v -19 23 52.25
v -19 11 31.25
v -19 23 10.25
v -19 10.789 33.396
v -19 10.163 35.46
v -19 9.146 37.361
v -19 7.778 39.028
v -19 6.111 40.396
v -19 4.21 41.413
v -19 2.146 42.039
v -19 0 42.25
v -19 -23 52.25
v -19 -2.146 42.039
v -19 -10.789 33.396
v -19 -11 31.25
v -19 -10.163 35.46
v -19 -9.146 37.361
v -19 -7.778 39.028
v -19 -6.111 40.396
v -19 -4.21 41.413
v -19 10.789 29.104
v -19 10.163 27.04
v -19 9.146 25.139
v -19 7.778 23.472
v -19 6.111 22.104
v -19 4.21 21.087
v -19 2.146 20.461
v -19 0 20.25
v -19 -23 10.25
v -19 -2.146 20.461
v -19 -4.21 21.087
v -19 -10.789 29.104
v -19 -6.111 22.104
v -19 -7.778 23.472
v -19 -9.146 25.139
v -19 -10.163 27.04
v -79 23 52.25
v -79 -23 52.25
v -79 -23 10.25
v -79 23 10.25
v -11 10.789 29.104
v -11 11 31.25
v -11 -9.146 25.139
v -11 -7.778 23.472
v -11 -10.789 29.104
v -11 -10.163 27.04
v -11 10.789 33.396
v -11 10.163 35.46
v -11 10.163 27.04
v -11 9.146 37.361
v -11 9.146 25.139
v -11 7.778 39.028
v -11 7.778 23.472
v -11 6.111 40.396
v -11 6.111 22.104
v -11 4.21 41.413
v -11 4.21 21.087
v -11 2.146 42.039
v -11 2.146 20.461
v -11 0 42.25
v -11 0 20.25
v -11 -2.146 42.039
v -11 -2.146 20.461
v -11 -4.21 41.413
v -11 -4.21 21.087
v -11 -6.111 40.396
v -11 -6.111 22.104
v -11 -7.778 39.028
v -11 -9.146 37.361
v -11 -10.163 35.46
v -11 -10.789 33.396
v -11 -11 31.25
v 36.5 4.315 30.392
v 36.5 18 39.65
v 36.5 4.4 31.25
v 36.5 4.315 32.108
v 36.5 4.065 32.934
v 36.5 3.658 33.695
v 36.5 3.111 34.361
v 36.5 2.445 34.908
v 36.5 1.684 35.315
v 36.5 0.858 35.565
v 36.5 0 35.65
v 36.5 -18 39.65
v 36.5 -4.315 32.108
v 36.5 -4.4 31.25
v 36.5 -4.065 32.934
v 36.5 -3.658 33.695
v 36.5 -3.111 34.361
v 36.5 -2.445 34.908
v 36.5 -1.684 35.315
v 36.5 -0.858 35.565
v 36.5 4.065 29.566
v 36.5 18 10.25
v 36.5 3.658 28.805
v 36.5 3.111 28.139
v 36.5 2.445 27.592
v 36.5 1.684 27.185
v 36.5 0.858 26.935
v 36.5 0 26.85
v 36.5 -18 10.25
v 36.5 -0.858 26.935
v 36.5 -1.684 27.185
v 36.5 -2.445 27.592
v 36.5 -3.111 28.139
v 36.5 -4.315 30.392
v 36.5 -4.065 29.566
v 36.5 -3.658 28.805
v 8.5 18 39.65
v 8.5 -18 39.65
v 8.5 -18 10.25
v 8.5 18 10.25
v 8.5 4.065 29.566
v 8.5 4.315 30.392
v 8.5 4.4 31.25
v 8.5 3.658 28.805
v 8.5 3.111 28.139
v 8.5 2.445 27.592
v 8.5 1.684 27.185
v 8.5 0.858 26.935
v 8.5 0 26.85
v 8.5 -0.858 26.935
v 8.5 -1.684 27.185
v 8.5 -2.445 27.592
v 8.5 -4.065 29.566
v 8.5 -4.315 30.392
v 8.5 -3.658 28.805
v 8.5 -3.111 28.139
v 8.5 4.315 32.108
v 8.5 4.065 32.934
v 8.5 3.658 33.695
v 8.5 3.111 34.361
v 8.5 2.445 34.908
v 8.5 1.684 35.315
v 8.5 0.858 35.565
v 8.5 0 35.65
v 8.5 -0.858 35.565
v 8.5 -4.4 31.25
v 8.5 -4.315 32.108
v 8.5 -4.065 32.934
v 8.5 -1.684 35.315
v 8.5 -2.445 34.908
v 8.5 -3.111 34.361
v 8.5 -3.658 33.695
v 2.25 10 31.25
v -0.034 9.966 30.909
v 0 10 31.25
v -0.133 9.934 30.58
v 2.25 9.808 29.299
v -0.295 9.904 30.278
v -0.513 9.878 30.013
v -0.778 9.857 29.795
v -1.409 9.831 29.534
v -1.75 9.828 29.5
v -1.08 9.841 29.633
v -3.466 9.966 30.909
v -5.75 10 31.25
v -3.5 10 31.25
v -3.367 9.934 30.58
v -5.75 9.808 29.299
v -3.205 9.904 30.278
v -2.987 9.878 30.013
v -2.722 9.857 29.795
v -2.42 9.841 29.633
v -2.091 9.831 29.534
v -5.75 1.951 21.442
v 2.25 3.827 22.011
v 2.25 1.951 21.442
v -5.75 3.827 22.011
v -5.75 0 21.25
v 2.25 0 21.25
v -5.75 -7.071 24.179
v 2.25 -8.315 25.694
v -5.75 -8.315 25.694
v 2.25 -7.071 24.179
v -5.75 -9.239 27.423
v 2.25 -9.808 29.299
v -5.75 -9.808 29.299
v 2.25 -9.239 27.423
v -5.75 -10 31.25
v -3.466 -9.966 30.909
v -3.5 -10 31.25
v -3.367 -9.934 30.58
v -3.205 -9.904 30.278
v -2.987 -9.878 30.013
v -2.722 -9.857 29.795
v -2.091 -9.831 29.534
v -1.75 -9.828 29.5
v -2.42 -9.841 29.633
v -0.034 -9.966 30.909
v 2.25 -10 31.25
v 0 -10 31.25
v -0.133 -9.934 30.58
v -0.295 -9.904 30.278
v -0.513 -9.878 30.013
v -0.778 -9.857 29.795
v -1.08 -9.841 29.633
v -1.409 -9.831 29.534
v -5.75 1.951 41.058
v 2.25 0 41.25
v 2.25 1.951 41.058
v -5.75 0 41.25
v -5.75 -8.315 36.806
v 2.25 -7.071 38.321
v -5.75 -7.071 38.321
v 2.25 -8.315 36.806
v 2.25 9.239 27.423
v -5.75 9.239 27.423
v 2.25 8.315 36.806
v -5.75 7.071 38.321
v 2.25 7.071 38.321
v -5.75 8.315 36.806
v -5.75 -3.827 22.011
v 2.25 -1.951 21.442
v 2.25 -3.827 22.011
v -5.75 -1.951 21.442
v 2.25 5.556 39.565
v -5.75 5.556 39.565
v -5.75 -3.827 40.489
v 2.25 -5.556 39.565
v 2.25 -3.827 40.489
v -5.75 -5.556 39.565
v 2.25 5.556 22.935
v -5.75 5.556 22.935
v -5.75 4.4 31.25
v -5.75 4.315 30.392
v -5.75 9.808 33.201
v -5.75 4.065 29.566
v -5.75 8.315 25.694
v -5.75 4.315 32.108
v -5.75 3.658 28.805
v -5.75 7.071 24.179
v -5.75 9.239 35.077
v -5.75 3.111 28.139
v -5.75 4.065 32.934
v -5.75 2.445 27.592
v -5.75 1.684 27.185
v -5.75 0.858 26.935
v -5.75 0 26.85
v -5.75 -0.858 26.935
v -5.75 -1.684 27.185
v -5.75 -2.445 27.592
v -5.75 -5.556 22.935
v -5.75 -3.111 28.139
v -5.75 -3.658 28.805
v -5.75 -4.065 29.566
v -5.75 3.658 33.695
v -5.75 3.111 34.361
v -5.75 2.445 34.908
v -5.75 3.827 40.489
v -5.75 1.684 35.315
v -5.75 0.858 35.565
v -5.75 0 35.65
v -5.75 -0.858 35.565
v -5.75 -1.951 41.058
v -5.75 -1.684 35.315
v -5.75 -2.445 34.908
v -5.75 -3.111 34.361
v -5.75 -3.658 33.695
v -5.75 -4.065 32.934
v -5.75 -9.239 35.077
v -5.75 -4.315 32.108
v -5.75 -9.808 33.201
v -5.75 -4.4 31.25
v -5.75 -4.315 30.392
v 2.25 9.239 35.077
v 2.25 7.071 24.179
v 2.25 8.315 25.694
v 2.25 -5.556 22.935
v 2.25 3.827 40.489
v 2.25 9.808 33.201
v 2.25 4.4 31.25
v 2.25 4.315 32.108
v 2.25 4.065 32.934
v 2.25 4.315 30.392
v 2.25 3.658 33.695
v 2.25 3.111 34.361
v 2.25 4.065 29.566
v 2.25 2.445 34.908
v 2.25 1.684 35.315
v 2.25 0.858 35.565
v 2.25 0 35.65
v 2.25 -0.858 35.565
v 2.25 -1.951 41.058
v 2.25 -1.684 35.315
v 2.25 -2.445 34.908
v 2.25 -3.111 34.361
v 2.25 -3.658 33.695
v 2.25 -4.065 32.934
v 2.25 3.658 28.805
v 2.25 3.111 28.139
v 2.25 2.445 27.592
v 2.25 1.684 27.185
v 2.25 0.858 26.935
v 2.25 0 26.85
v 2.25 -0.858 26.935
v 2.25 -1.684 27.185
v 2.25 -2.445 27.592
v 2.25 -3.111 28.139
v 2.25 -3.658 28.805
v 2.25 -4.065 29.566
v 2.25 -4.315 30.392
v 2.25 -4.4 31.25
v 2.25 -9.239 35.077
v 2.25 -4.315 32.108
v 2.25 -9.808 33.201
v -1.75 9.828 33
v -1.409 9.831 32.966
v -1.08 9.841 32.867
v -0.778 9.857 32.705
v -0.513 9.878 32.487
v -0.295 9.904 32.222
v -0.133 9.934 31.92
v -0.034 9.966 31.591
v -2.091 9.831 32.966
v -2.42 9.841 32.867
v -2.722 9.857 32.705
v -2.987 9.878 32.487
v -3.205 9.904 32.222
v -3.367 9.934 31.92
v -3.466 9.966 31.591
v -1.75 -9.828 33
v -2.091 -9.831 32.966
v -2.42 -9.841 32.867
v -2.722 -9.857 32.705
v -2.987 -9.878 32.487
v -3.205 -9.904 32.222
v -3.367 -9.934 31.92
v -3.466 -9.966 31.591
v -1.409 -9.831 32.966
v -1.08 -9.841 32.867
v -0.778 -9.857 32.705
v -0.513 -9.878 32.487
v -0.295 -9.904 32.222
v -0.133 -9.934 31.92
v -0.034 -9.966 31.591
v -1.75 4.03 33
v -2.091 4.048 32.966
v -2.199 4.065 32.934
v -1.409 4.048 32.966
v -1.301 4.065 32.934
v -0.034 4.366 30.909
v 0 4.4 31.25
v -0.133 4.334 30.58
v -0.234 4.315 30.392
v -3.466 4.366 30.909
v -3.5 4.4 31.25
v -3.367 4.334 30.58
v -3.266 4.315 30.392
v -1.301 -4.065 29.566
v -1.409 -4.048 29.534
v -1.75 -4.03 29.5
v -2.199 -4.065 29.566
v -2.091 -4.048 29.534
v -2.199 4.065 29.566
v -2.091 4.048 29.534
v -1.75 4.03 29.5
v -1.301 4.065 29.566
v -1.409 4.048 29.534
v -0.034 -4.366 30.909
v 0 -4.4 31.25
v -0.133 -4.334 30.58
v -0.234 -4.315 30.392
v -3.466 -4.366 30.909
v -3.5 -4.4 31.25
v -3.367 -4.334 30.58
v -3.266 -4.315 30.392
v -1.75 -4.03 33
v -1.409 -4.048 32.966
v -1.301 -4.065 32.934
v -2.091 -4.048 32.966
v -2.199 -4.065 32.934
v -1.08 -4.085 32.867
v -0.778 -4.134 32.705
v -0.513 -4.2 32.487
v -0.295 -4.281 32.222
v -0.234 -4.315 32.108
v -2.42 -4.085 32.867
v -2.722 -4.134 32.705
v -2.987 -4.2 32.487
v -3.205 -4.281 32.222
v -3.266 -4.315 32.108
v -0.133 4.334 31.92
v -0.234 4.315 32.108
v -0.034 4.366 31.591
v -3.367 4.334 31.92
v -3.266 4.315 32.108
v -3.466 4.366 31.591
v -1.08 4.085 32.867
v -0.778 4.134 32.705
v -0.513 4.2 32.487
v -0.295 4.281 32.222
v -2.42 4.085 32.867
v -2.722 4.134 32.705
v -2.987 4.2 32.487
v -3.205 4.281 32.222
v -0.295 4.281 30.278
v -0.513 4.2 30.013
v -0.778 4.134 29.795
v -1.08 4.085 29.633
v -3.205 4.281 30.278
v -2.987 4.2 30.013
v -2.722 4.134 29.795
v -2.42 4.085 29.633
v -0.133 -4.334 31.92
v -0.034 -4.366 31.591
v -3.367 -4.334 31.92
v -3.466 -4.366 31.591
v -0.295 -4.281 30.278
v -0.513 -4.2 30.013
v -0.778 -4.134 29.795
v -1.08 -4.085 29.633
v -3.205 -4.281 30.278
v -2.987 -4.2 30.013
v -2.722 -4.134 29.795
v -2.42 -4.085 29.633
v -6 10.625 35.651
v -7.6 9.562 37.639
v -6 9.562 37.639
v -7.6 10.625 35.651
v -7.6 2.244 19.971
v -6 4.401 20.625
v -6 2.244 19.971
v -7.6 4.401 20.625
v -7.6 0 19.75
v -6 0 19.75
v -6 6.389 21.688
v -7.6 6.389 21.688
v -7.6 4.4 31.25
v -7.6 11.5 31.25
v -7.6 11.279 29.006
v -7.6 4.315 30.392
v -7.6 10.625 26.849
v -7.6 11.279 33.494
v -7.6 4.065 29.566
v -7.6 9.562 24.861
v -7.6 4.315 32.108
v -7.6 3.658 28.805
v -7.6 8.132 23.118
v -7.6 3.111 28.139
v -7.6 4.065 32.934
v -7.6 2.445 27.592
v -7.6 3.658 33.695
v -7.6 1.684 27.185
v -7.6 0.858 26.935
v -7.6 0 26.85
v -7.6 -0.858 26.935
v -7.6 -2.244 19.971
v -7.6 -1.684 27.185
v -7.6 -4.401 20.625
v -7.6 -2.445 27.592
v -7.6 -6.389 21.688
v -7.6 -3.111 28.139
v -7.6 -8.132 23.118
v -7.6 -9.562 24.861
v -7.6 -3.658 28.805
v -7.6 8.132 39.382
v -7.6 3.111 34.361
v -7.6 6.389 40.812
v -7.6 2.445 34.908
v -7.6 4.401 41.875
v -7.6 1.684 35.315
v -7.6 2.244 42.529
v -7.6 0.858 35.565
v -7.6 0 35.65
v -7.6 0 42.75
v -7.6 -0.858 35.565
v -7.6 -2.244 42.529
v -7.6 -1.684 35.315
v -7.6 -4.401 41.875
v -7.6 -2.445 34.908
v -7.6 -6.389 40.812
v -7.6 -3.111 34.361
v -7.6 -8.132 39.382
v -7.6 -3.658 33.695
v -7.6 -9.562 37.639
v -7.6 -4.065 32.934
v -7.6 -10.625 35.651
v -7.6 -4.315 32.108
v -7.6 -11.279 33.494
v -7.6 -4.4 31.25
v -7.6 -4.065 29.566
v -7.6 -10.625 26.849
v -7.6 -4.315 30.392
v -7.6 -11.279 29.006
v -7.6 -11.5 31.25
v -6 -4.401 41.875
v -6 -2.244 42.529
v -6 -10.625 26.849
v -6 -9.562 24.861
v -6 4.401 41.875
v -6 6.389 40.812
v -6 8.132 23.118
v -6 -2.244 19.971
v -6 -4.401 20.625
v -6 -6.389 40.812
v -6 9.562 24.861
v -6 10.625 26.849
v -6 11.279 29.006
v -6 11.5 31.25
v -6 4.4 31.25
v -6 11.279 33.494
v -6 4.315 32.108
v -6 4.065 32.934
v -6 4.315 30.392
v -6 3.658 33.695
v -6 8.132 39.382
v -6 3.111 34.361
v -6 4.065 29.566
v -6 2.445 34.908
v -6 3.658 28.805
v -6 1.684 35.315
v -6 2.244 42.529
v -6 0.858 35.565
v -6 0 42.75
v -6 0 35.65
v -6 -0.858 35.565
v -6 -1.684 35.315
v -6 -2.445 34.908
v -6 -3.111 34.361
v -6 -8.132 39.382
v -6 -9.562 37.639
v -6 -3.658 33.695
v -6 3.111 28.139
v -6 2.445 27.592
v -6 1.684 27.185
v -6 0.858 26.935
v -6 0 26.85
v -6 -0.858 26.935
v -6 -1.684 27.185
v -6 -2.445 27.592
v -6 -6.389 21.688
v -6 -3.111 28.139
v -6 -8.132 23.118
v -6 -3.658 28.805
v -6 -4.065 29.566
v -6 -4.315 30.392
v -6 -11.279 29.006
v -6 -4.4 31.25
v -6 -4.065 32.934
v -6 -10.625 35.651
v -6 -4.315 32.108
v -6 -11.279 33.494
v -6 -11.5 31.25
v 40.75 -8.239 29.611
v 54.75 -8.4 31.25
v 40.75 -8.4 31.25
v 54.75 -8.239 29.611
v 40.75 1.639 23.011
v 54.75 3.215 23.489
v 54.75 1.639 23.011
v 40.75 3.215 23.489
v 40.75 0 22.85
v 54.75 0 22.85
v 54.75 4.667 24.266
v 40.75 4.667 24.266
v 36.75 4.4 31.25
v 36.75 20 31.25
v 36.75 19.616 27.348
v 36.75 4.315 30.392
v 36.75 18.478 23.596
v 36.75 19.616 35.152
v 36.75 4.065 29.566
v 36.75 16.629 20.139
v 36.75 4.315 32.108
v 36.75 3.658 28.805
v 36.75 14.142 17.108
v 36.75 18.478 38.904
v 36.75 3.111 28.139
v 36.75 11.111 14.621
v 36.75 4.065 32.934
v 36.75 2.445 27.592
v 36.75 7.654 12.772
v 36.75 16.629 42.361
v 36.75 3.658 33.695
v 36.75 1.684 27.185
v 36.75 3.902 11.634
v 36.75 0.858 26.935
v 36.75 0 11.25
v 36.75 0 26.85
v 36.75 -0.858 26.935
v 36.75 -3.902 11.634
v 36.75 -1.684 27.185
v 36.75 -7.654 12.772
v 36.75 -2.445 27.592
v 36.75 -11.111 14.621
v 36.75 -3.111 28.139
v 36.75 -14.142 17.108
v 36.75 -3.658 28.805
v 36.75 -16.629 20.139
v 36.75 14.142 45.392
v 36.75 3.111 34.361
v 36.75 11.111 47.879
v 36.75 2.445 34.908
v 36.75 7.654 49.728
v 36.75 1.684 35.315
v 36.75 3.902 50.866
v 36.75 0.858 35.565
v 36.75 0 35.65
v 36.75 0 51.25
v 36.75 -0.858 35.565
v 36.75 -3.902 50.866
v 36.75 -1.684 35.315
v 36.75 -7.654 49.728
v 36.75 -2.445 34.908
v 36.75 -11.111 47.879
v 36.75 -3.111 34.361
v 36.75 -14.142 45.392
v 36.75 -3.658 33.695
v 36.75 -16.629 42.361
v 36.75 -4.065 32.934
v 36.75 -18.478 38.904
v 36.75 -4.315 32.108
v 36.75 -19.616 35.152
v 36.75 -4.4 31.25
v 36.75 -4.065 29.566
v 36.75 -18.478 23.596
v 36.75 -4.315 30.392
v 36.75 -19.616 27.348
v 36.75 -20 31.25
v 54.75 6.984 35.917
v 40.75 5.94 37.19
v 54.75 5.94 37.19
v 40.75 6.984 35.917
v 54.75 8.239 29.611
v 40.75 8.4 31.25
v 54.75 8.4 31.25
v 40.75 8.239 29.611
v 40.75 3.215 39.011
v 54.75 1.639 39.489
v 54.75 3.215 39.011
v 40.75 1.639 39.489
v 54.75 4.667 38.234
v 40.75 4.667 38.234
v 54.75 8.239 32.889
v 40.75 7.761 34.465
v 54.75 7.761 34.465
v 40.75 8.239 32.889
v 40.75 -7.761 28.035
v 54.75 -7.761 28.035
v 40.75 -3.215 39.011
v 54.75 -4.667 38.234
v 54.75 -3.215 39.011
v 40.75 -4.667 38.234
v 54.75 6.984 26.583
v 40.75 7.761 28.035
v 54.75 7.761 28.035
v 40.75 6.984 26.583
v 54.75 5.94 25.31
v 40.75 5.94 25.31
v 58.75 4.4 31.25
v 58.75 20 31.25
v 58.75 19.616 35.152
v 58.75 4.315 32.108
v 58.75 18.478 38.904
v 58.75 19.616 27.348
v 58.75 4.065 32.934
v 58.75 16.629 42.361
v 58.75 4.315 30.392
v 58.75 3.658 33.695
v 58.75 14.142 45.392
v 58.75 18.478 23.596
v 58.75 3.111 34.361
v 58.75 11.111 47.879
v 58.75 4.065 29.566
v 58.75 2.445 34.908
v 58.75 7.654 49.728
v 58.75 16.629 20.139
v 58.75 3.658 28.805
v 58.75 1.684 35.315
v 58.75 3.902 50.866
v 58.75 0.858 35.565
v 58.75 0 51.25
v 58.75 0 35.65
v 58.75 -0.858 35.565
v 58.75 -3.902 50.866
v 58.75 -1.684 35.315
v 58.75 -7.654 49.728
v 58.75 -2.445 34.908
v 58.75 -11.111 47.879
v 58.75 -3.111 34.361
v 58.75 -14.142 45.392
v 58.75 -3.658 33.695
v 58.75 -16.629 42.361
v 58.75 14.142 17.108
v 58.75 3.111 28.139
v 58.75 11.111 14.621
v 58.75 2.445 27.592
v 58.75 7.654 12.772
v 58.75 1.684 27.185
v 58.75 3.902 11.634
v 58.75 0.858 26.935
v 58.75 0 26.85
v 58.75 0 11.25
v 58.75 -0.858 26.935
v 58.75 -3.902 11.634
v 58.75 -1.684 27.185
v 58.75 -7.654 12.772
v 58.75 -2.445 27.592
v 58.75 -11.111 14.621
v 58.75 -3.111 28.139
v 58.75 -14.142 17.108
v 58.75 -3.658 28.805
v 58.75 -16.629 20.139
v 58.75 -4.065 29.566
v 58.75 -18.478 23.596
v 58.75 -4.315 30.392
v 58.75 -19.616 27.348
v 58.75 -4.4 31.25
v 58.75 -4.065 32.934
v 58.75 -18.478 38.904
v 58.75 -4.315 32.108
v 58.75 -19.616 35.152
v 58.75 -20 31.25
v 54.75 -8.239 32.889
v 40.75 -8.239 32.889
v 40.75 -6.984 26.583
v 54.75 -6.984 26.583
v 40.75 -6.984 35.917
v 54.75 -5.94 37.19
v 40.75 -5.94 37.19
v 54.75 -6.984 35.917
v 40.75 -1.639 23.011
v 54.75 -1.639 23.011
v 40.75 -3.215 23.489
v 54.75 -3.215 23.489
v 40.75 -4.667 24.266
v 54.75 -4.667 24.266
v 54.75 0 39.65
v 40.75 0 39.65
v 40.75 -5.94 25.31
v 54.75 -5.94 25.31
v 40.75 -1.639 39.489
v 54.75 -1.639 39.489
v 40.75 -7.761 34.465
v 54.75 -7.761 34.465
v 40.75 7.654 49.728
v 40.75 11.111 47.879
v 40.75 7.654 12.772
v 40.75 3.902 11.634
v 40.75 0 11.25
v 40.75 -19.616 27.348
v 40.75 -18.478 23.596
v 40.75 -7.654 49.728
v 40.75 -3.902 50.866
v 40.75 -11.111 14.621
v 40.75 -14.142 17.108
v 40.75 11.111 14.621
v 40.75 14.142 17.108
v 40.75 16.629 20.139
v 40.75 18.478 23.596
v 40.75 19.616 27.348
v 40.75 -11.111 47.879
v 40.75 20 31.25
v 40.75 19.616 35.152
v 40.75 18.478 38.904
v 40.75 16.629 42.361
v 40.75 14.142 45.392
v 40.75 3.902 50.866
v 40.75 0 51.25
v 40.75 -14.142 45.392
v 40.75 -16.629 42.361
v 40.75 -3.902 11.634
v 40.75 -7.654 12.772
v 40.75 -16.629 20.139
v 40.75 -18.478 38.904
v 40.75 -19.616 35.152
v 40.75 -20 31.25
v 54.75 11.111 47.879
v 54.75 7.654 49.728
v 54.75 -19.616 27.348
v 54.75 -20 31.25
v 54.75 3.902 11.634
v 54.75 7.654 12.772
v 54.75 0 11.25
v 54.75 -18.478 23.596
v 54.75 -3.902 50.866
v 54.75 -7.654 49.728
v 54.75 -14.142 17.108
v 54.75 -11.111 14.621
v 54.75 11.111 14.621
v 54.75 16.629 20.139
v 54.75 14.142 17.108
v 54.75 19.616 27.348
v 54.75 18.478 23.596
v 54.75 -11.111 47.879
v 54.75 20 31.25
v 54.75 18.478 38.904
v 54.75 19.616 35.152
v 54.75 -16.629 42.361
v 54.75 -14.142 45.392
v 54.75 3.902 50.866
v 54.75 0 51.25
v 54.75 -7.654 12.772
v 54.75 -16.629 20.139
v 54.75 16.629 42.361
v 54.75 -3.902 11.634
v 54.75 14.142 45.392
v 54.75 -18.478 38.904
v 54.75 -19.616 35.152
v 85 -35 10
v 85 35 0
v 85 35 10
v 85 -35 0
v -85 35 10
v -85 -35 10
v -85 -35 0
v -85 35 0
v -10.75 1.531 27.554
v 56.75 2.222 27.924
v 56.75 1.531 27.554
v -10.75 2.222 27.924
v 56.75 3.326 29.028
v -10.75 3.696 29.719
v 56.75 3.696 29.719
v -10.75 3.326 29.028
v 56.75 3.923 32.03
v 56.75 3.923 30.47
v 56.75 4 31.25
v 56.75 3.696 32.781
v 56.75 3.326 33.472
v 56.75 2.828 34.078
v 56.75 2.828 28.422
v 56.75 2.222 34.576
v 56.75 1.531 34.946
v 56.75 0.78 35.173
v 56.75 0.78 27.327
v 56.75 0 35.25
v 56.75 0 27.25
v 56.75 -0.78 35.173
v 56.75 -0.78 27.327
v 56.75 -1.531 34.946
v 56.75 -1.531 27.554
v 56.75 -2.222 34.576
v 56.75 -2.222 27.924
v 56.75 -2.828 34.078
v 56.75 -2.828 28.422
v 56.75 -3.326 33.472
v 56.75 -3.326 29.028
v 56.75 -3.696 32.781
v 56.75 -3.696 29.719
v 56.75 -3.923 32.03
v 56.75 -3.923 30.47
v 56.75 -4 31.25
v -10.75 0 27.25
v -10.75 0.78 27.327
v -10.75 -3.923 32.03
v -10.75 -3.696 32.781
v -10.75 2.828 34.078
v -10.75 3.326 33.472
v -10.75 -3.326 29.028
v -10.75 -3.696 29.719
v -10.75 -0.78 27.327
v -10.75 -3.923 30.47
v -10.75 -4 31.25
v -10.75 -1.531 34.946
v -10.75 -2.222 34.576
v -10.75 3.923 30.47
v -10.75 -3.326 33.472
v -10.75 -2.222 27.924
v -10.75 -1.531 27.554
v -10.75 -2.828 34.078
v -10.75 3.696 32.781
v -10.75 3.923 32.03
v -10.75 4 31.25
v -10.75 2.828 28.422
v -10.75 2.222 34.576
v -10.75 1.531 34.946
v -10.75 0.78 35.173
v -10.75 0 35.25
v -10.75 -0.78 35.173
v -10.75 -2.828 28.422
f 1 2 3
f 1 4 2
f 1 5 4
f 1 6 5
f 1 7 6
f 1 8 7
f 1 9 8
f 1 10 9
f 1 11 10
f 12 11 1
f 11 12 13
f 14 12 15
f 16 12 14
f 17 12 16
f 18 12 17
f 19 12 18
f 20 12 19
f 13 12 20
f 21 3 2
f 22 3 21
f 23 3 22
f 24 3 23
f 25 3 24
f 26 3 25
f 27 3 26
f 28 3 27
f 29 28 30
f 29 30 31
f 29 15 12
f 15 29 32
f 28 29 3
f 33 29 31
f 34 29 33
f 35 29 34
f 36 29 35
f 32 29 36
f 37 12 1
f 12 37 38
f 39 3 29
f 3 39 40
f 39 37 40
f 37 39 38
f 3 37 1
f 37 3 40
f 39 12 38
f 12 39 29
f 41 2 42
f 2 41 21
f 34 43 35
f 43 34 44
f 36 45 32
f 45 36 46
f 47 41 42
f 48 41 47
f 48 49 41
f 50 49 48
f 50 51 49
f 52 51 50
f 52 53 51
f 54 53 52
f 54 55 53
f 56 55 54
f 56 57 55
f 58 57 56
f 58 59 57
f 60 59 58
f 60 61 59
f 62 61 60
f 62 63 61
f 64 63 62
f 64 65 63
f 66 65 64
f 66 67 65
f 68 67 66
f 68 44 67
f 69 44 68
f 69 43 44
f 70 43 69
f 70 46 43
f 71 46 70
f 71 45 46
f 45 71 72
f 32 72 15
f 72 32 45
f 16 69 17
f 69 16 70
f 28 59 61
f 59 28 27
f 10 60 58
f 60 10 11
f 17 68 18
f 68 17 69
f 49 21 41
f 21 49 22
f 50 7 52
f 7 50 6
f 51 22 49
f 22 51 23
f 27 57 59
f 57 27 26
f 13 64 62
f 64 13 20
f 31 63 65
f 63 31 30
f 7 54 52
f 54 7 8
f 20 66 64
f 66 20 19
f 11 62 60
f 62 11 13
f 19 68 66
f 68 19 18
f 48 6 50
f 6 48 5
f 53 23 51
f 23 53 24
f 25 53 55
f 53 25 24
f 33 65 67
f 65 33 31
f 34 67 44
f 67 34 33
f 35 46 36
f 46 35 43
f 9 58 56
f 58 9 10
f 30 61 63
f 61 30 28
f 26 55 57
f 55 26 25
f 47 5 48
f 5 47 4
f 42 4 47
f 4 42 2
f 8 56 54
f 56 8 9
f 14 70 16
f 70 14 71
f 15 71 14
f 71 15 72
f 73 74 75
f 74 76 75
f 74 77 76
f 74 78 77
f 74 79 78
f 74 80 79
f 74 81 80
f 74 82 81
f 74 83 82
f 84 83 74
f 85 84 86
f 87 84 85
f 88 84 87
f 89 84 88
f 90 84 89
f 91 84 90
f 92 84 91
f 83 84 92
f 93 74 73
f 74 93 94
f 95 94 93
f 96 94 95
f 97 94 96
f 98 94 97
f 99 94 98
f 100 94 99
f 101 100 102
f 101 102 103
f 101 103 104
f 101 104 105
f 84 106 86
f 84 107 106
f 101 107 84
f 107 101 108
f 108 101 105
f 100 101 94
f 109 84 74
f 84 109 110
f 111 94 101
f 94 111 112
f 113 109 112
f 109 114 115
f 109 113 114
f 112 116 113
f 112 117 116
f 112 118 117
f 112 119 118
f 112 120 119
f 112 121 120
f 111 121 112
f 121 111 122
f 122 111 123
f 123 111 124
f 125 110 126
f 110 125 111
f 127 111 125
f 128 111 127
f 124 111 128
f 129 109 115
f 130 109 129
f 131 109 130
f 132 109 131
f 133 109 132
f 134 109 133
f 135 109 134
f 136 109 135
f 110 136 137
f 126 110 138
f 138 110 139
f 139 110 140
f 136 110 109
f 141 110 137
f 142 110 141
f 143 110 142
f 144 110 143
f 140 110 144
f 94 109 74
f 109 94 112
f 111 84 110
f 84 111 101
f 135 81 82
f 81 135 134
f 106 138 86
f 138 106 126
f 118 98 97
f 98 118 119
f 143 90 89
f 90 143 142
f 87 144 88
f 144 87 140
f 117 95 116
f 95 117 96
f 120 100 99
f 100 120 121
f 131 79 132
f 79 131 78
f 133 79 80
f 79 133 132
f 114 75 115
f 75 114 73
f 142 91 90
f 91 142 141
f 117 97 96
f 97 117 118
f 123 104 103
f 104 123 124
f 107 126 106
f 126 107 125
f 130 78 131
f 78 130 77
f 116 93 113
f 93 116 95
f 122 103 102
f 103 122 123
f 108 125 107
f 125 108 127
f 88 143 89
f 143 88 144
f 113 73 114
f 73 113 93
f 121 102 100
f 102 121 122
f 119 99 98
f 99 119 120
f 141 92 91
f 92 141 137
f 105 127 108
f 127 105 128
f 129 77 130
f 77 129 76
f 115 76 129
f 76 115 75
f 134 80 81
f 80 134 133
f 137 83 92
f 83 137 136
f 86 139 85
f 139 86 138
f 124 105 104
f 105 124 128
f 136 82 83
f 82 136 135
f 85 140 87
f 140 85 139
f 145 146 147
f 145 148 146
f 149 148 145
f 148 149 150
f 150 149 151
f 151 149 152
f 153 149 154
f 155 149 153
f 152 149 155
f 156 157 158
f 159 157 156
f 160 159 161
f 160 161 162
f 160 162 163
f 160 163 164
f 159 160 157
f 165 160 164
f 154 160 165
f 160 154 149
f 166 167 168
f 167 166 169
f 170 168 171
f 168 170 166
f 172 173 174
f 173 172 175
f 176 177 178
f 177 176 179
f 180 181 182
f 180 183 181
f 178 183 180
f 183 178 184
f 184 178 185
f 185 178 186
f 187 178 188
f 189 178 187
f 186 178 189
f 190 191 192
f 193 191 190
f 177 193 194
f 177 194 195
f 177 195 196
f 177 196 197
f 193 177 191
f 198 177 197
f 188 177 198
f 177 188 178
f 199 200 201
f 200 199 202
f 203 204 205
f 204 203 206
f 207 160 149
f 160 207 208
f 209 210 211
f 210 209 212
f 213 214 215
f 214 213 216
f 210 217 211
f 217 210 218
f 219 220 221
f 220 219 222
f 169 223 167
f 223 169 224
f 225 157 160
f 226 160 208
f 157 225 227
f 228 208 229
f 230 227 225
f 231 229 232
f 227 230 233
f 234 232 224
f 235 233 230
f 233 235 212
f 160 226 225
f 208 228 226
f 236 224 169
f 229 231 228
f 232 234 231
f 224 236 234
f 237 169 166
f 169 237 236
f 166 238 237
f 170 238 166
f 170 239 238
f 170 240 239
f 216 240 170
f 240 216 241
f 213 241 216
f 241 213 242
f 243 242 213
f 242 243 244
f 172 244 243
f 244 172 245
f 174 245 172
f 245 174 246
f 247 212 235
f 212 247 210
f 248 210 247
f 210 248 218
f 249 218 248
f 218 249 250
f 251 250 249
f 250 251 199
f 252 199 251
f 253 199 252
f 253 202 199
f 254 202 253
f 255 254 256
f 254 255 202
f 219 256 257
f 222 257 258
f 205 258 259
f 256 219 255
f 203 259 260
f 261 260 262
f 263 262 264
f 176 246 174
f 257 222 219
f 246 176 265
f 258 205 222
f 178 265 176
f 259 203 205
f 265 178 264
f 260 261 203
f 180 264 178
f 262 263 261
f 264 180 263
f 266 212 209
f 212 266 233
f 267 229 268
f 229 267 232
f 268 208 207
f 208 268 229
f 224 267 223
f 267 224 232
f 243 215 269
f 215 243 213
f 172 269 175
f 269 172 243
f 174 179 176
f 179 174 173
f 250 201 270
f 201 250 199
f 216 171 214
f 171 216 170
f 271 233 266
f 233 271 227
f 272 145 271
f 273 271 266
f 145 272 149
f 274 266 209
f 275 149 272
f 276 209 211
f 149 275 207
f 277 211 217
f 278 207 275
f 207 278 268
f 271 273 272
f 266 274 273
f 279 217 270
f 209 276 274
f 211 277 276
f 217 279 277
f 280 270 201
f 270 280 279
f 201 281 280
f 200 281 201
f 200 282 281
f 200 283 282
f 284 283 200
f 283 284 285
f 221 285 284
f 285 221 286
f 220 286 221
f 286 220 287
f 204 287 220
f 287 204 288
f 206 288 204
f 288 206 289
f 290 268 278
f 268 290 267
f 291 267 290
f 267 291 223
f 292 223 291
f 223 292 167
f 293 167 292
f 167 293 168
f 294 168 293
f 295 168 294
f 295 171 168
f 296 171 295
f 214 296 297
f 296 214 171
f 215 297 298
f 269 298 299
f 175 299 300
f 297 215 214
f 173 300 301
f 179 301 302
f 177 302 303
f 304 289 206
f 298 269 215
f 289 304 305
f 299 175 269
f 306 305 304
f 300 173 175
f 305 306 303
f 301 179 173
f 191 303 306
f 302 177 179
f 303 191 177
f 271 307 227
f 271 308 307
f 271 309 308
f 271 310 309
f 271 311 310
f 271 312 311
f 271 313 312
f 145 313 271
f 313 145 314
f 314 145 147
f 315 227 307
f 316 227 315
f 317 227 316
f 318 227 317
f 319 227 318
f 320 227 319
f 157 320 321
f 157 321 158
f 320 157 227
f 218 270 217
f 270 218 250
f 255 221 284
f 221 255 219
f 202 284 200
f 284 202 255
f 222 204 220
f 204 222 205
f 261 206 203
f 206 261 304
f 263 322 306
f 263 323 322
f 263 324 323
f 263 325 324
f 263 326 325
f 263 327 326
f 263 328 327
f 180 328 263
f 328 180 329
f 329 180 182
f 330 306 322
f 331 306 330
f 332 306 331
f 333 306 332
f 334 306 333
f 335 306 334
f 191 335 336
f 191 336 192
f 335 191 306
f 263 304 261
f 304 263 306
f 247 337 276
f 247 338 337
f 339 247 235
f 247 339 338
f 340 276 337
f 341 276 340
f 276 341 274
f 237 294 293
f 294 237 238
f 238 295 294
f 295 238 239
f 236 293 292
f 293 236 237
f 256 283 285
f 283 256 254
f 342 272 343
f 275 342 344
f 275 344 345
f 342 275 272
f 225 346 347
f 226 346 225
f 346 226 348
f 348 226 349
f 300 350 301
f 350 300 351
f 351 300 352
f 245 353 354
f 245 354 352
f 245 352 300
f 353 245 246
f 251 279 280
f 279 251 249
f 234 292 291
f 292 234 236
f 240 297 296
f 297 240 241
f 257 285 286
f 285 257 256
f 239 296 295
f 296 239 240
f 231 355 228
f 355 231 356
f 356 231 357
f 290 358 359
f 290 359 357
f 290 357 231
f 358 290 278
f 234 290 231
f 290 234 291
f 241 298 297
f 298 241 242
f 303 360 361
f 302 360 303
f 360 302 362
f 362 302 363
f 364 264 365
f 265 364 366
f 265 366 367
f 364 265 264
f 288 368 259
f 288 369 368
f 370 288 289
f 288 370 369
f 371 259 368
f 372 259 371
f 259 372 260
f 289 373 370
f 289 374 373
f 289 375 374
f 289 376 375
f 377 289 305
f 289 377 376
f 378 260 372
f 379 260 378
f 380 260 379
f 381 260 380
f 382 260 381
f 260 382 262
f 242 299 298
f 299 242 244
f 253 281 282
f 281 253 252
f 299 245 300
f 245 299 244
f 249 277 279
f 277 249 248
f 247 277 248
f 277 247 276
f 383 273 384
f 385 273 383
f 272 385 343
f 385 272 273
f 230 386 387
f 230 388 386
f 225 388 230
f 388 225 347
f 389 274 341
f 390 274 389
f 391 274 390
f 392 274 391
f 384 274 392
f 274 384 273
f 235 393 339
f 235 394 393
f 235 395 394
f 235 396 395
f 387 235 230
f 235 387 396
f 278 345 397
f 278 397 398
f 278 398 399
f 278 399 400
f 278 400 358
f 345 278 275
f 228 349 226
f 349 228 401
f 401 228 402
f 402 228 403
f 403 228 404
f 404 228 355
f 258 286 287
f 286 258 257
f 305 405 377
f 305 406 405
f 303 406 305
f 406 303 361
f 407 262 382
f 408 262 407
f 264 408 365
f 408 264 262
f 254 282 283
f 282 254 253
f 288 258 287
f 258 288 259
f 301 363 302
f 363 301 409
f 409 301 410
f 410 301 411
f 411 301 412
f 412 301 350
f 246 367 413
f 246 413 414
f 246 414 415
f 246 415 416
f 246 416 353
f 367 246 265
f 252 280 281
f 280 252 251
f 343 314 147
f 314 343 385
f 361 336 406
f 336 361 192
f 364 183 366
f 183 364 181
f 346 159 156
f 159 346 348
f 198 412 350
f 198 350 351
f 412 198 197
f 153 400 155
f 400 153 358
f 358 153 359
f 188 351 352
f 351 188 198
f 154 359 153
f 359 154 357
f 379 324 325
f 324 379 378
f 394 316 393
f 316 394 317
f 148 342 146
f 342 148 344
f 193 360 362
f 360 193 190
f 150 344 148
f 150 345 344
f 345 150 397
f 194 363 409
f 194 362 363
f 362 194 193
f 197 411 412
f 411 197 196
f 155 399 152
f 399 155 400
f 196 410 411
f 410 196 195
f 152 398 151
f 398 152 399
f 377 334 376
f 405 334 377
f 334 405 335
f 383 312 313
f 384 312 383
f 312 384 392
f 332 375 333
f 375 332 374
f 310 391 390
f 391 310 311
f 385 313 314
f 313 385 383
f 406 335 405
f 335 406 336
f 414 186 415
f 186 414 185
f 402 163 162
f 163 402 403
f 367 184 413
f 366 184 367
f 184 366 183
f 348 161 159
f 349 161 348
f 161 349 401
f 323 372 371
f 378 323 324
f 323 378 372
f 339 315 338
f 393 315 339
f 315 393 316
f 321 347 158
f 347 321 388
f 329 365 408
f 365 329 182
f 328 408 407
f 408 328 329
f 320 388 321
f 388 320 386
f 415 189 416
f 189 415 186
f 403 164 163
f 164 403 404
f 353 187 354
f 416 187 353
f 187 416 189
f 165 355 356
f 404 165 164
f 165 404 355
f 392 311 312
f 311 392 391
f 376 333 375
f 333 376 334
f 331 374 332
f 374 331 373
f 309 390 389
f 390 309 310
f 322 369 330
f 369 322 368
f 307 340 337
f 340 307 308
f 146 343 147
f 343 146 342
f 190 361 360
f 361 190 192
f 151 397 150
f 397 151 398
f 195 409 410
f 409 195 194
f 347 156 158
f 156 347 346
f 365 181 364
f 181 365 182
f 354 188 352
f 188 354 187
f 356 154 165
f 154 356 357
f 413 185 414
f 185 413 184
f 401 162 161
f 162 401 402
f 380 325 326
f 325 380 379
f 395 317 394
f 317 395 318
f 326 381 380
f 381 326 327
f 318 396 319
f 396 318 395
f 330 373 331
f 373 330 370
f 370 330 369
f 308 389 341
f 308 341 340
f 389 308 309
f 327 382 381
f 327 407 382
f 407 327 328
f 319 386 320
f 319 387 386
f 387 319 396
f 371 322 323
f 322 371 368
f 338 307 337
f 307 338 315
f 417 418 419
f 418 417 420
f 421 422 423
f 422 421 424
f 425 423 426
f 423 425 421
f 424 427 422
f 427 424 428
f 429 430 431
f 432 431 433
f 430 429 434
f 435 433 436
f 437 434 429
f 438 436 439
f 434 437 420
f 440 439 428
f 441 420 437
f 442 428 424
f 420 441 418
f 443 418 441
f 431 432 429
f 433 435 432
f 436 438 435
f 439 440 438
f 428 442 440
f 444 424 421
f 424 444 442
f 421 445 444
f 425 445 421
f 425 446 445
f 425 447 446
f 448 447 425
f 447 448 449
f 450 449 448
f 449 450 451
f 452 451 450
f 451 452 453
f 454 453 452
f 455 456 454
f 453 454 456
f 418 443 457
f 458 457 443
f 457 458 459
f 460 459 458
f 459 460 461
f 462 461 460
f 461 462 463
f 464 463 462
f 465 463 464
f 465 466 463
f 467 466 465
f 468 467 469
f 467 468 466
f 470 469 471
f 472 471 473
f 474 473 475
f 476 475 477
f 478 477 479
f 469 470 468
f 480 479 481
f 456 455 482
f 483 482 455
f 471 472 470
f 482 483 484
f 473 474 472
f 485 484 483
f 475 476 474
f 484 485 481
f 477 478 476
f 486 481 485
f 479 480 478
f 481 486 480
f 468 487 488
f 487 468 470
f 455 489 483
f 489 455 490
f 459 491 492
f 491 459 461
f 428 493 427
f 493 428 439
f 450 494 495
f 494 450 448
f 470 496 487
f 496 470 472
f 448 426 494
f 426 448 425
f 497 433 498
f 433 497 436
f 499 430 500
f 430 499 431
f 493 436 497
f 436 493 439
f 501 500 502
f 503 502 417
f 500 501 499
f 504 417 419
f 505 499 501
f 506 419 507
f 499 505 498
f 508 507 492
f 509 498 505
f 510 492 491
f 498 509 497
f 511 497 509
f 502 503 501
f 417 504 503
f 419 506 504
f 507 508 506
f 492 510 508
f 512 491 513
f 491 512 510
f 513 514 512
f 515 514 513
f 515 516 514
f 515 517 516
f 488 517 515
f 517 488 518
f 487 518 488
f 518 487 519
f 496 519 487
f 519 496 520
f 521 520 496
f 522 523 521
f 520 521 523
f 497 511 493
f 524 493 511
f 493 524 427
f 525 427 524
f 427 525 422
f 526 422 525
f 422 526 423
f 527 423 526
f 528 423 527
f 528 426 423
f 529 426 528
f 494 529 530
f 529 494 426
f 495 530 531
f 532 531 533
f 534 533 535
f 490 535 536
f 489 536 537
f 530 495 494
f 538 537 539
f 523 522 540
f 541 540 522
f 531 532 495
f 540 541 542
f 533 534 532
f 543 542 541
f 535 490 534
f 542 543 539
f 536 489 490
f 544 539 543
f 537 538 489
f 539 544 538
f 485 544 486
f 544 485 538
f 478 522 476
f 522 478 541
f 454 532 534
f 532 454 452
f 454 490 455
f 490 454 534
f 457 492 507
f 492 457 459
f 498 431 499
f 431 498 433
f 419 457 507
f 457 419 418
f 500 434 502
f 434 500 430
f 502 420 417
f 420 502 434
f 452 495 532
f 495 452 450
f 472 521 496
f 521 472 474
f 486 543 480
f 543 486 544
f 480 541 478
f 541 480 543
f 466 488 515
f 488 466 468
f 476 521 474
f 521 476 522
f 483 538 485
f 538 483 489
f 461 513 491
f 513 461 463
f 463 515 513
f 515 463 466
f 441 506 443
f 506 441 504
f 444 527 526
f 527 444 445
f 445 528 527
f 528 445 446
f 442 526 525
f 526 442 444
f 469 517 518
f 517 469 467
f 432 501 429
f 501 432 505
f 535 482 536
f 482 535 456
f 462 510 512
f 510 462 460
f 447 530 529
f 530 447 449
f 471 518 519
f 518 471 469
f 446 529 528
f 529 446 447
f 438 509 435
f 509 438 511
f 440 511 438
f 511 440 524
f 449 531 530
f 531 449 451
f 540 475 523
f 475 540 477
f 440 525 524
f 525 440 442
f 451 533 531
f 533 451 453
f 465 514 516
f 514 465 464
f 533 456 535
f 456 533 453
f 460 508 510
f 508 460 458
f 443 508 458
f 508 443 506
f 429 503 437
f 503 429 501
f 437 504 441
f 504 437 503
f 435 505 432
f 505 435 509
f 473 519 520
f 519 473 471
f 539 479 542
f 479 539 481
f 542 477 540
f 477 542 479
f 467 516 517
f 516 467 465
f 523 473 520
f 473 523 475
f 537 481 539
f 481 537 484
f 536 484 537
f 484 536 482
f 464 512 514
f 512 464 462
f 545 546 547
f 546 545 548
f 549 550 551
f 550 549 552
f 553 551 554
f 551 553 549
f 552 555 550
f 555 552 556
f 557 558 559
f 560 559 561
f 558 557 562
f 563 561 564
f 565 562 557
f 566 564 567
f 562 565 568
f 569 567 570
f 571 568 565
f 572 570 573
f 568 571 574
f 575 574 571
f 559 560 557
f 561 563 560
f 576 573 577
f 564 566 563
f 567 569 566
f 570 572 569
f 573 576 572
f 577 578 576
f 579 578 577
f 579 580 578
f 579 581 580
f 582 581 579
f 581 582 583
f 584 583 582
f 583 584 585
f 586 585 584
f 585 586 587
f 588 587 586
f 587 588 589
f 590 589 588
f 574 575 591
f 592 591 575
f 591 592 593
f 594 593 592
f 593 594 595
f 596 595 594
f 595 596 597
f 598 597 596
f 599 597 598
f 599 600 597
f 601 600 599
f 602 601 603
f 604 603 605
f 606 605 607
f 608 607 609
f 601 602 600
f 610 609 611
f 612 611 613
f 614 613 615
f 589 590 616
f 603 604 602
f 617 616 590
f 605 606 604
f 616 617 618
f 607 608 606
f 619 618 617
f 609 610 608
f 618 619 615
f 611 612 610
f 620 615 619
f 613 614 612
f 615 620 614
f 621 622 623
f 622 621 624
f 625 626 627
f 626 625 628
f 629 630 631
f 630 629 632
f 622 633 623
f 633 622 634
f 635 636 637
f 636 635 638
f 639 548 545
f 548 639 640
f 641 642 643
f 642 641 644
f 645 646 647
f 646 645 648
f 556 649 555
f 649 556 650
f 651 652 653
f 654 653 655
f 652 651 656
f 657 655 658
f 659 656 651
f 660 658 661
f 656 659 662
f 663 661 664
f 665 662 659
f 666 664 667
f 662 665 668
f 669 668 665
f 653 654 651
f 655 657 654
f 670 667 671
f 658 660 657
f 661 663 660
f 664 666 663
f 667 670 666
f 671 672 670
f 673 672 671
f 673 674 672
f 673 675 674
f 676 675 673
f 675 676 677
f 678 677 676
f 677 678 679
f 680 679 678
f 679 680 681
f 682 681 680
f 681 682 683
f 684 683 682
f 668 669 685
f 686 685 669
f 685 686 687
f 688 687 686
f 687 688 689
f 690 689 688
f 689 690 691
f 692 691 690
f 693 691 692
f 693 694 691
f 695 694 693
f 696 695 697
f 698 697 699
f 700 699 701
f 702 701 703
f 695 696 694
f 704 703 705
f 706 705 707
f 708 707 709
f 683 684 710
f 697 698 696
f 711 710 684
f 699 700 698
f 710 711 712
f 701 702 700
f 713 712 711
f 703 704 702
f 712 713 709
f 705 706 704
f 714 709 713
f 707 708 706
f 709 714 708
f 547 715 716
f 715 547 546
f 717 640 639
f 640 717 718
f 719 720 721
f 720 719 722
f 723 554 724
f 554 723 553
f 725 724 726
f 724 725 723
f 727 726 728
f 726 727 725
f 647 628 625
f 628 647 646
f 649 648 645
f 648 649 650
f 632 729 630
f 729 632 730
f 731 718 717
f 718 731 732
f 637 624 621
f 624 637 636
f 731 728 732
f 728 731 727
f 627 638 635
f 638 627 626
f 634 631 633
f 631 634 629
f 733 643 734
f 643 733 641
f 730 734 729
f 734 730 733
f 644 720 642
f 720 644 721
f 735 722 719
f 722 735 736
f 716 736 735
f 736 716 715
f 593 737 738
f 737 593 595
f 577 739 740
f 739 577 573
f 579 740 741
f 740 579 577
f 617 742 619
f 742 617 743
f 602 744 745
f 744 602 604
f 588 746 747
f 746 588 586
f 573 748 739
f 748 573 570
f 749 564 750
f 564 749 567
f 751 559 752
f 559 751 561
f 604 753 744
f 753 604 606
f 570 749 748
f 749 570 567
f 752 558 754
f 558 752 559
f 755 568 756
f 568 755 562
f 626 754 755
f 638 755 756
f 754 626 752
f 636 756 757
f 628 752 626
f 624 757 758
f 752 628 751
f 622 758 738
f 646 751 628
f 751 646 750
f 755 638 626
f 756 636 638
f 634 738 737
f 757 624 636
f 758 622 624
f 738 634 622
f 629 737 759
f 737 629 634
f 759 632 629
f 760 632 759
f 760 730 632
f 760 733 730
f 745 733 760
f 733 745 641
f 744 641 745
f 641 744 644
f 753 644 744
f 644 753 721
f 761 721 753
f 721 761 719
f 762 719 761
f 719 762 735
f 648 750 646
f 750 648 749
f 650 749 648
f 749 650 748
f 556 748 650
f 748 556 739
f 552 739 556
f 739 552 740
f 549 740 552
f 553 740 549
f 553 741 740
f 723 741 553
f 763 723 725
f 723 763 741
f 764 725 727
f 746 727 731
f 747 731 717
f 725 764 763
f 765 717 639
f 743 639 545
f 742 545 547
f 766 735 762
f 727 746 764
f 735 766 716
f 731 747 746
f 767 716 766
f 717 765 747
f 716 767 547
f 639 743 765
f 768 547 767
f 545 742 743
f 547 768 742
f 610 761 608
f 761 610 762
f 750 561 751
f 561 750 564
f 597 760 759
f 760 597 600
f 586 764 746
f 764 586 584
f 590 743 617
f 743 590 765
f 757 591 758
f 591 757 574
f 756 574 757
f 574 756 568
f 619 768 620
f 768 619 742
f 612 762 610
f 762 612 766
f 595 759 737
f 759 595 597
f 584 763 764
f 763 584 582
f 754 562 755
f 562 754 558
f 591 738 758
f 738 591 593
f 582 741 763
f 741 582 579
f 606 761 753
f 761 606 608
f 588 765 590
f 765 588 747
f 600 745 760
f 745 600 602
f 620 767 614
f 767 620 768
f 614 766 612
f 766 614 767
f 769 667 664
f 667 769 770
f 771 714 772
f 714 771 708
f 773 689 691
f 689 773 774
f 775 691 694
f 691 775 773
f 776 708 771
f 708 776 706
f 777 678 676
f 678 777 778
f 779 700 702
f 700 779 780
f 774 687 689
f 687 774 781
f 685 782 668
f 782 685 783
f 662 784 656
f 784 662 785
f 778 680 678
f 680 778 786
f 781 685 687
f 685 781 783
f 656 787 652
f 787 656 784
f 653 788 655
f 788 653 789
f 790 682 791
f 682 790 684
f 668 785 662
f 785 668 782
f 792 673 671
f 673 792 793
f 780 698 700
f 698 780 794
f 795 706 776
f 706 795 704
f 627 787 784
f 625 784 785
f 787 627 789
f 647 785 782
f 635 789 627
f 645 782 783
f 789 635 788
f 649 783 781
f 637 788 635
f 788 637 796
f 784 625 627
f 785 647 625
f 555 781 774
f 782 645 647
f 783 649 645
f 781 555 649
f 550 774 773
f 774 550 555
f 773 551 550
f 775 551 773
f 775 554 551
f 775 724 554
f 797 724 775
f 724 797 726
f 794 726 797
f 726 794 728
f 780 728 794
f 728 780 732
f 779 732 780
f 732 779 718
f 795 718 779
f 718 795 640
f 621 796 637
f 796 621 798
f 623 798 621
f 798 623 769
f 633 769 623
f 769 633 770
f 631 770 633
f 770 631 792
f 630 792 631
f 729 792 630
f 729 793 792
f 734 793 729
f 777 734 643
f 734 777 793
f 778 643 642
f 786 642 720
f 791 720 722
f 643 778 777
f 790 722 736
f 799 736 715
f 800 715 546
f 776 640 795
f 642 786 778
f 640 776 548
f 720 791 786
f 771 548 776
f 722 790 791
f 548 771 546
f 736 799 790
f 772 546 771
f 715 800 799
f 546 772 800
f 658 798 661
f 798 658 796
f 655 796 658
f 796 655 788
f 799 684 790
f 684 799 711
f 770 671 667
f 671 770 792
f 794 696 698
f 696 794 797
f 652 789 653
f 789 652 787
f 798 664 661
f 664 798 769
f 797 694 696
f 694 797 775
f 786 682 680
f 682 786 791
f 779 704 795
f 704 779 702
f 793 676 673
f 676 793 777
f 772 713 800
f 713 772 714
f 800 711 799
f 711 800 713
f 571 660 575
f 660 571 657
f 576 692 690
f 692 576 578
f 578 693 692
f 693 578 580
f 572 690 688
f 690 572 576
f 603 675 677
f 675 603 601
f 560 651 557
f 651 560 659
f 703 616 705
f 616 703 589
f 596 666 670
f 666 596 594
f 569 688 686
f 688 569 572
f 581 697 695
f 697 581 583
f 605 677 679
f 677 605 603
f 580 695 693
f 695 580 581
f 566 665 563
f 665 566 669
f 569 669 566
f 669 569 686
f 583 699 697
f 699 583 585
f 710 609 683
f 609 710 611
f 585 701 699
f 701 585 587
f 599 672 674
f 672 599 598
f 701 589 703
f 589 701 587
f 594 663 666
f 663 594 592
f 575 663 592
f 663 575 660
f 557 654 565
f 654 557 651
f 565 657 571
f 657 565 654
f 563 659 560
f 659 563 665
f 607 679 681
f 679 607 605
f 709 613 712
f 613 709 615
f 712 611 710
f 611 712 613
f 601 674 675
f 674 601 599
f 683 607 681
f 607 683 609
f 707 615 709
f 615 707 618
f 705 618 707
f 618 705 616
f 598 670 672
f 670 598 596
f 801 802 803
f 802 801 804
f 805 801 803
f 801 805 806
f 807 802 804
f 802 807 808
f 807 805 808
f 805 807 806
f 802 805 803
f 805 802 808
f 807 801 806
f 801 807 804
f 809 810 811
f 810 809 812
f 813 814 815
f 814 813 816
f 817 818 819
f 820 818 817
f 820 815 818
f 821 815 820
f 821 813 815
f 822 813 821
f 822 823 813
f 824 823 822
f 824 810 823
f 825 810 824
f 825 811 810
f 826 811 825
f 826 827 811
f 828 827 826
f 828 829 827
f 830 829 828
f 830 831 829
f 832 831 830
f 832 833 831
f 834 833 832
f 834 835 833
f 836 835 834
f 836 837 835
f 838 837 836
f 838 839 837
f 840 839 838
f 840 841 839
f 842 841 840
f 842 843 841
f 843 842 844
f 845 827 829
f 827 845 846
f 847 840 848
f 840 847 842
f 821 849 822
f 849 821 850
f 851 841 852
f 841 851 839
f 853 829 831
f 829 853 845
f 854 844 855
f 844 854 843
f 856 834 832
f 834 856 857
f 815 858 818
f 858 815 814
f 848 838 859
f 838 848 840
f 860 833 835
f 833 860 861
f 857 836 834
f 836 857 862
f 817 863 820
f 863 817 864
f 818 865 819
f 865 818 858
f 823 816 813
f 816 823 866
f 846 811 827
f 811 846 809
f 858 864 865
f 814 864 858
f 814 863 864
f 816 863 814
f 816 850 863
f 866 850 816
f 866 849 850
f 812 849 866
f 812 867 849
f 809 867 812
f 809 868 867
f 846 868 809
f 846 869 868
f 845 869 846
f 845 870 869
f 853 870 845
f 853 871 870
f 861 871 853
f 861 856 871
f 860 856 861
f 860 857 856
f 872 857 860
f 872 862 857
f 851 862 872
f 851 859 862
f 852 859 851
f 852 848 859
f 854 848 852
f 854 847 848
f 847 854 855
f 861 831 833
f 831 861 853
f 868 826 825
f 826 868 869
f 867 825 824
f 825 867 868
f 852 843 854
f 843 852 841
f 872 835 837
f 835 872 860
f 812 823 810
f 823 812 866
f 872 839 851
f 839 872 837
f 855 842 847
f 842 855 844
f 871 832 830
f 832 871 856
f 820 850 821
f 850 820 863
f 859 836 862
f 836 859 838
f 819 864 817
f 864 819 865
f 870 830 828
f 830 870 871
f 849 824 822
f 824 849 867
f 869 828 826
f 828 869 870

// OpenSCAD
$fn = 32;

// ------------------------------------------------------------------------
// Motor drive station: motor 60 x 42 mm, shaft d8, pulley d40
// Every part is its own module, assembly() places every instance.
// ------------------------------------------------------------------------

// --- part 1 ---
module station_bed() {
  difference() {
    translate([-85, -35, 0]) cube([170, 70, 10]);
  }
}

// --- part 2 ---
module drive_motor() {
  union() {
    translate([-30, -23, 0]) cube([60, 46, 42]);
    translate([34, 0, 21]) rotate([0, 90, 0]) cylinder(h = 8, d = 22, center = true);
  }
}

// --- part 3 ---
module pillow_block() {
  difference() {
    translate([-14, -18, 0]) cube([28, 36, 29.4]);
    translate([0, 0, 21]) rotate([0, 90, 0]) cylinder(h = 30, d = 8.8, center = true);
  }
}

// --- part 4 ---
module drive_shaft() {
  translate([0, 0, -33.75]) cylinder(h = 67.5, d = 8);
}

// --- part 5 ---
module shaft_collar() {
  difference() {
    cylinder(h = 8, d = 20);
    translate([0, 0, -1]) cylinder(h = 10, d = 8.8);
    translate([0, 0, 4]) rotate([90, 0, 0]) cylinder(h = 22, d = 3.5, center = true);
  }
}

// --- part 6 ---
module collar_washer() {
  difference() {
      translate([0, 0, 0]) cylinder(h = 1.6, d = 23);
      translate([0, 0, -1]) cylinder(h = 3.6, d = 8.8);
    }
}

// --- part 7 ---
module drive_pulley() {
  difference() {
    union() {
      cylinder(h = 22, d = 16.8);
      cylinder(h = 4, d = 40);
      translate([0, 0, 18]) cylinder(h = 4, d = 40);
    }
    translate([0, 0, -1]) cylinder(h = 24, d = 8.8);
  }
}

// --- assembly ---
module assembly() {
  color([0.80, 0.24, 0.20]) translate([0, 0, 0]) rotate([0, 0, 0]) station_bed();
  color([0.20, 0.45, 0.75]) translate([-49, 0, 10.25]) rotate([0, 0, 0]) drive_motor();
  color([0.25, 0.62, 0.32]) translate([22.5, 0, 10.25]) rotate([0, 0, 0]) pillow_block();
  color([0.92, 0.70, 0.18]) translate([23, 0, 31.25]) rotate([0, 90, 0]) drive_shaft();
  color([0.58, 0.35, 0.70]) translate([-5.75, 0, 31.25]) rotate([0, 90, 0]) shaft_collar();
  color([0.16, 0.66, 0.66]) translate([-7.6, 0, 31.25]) rotate([0, 90, 0]) collar_washer();
  color([0.85, 0.48, 0.18]) translate([36.75, 0, 31.25]) rotate([0, 90, 0]) drive_pulley();
}

assembly();
